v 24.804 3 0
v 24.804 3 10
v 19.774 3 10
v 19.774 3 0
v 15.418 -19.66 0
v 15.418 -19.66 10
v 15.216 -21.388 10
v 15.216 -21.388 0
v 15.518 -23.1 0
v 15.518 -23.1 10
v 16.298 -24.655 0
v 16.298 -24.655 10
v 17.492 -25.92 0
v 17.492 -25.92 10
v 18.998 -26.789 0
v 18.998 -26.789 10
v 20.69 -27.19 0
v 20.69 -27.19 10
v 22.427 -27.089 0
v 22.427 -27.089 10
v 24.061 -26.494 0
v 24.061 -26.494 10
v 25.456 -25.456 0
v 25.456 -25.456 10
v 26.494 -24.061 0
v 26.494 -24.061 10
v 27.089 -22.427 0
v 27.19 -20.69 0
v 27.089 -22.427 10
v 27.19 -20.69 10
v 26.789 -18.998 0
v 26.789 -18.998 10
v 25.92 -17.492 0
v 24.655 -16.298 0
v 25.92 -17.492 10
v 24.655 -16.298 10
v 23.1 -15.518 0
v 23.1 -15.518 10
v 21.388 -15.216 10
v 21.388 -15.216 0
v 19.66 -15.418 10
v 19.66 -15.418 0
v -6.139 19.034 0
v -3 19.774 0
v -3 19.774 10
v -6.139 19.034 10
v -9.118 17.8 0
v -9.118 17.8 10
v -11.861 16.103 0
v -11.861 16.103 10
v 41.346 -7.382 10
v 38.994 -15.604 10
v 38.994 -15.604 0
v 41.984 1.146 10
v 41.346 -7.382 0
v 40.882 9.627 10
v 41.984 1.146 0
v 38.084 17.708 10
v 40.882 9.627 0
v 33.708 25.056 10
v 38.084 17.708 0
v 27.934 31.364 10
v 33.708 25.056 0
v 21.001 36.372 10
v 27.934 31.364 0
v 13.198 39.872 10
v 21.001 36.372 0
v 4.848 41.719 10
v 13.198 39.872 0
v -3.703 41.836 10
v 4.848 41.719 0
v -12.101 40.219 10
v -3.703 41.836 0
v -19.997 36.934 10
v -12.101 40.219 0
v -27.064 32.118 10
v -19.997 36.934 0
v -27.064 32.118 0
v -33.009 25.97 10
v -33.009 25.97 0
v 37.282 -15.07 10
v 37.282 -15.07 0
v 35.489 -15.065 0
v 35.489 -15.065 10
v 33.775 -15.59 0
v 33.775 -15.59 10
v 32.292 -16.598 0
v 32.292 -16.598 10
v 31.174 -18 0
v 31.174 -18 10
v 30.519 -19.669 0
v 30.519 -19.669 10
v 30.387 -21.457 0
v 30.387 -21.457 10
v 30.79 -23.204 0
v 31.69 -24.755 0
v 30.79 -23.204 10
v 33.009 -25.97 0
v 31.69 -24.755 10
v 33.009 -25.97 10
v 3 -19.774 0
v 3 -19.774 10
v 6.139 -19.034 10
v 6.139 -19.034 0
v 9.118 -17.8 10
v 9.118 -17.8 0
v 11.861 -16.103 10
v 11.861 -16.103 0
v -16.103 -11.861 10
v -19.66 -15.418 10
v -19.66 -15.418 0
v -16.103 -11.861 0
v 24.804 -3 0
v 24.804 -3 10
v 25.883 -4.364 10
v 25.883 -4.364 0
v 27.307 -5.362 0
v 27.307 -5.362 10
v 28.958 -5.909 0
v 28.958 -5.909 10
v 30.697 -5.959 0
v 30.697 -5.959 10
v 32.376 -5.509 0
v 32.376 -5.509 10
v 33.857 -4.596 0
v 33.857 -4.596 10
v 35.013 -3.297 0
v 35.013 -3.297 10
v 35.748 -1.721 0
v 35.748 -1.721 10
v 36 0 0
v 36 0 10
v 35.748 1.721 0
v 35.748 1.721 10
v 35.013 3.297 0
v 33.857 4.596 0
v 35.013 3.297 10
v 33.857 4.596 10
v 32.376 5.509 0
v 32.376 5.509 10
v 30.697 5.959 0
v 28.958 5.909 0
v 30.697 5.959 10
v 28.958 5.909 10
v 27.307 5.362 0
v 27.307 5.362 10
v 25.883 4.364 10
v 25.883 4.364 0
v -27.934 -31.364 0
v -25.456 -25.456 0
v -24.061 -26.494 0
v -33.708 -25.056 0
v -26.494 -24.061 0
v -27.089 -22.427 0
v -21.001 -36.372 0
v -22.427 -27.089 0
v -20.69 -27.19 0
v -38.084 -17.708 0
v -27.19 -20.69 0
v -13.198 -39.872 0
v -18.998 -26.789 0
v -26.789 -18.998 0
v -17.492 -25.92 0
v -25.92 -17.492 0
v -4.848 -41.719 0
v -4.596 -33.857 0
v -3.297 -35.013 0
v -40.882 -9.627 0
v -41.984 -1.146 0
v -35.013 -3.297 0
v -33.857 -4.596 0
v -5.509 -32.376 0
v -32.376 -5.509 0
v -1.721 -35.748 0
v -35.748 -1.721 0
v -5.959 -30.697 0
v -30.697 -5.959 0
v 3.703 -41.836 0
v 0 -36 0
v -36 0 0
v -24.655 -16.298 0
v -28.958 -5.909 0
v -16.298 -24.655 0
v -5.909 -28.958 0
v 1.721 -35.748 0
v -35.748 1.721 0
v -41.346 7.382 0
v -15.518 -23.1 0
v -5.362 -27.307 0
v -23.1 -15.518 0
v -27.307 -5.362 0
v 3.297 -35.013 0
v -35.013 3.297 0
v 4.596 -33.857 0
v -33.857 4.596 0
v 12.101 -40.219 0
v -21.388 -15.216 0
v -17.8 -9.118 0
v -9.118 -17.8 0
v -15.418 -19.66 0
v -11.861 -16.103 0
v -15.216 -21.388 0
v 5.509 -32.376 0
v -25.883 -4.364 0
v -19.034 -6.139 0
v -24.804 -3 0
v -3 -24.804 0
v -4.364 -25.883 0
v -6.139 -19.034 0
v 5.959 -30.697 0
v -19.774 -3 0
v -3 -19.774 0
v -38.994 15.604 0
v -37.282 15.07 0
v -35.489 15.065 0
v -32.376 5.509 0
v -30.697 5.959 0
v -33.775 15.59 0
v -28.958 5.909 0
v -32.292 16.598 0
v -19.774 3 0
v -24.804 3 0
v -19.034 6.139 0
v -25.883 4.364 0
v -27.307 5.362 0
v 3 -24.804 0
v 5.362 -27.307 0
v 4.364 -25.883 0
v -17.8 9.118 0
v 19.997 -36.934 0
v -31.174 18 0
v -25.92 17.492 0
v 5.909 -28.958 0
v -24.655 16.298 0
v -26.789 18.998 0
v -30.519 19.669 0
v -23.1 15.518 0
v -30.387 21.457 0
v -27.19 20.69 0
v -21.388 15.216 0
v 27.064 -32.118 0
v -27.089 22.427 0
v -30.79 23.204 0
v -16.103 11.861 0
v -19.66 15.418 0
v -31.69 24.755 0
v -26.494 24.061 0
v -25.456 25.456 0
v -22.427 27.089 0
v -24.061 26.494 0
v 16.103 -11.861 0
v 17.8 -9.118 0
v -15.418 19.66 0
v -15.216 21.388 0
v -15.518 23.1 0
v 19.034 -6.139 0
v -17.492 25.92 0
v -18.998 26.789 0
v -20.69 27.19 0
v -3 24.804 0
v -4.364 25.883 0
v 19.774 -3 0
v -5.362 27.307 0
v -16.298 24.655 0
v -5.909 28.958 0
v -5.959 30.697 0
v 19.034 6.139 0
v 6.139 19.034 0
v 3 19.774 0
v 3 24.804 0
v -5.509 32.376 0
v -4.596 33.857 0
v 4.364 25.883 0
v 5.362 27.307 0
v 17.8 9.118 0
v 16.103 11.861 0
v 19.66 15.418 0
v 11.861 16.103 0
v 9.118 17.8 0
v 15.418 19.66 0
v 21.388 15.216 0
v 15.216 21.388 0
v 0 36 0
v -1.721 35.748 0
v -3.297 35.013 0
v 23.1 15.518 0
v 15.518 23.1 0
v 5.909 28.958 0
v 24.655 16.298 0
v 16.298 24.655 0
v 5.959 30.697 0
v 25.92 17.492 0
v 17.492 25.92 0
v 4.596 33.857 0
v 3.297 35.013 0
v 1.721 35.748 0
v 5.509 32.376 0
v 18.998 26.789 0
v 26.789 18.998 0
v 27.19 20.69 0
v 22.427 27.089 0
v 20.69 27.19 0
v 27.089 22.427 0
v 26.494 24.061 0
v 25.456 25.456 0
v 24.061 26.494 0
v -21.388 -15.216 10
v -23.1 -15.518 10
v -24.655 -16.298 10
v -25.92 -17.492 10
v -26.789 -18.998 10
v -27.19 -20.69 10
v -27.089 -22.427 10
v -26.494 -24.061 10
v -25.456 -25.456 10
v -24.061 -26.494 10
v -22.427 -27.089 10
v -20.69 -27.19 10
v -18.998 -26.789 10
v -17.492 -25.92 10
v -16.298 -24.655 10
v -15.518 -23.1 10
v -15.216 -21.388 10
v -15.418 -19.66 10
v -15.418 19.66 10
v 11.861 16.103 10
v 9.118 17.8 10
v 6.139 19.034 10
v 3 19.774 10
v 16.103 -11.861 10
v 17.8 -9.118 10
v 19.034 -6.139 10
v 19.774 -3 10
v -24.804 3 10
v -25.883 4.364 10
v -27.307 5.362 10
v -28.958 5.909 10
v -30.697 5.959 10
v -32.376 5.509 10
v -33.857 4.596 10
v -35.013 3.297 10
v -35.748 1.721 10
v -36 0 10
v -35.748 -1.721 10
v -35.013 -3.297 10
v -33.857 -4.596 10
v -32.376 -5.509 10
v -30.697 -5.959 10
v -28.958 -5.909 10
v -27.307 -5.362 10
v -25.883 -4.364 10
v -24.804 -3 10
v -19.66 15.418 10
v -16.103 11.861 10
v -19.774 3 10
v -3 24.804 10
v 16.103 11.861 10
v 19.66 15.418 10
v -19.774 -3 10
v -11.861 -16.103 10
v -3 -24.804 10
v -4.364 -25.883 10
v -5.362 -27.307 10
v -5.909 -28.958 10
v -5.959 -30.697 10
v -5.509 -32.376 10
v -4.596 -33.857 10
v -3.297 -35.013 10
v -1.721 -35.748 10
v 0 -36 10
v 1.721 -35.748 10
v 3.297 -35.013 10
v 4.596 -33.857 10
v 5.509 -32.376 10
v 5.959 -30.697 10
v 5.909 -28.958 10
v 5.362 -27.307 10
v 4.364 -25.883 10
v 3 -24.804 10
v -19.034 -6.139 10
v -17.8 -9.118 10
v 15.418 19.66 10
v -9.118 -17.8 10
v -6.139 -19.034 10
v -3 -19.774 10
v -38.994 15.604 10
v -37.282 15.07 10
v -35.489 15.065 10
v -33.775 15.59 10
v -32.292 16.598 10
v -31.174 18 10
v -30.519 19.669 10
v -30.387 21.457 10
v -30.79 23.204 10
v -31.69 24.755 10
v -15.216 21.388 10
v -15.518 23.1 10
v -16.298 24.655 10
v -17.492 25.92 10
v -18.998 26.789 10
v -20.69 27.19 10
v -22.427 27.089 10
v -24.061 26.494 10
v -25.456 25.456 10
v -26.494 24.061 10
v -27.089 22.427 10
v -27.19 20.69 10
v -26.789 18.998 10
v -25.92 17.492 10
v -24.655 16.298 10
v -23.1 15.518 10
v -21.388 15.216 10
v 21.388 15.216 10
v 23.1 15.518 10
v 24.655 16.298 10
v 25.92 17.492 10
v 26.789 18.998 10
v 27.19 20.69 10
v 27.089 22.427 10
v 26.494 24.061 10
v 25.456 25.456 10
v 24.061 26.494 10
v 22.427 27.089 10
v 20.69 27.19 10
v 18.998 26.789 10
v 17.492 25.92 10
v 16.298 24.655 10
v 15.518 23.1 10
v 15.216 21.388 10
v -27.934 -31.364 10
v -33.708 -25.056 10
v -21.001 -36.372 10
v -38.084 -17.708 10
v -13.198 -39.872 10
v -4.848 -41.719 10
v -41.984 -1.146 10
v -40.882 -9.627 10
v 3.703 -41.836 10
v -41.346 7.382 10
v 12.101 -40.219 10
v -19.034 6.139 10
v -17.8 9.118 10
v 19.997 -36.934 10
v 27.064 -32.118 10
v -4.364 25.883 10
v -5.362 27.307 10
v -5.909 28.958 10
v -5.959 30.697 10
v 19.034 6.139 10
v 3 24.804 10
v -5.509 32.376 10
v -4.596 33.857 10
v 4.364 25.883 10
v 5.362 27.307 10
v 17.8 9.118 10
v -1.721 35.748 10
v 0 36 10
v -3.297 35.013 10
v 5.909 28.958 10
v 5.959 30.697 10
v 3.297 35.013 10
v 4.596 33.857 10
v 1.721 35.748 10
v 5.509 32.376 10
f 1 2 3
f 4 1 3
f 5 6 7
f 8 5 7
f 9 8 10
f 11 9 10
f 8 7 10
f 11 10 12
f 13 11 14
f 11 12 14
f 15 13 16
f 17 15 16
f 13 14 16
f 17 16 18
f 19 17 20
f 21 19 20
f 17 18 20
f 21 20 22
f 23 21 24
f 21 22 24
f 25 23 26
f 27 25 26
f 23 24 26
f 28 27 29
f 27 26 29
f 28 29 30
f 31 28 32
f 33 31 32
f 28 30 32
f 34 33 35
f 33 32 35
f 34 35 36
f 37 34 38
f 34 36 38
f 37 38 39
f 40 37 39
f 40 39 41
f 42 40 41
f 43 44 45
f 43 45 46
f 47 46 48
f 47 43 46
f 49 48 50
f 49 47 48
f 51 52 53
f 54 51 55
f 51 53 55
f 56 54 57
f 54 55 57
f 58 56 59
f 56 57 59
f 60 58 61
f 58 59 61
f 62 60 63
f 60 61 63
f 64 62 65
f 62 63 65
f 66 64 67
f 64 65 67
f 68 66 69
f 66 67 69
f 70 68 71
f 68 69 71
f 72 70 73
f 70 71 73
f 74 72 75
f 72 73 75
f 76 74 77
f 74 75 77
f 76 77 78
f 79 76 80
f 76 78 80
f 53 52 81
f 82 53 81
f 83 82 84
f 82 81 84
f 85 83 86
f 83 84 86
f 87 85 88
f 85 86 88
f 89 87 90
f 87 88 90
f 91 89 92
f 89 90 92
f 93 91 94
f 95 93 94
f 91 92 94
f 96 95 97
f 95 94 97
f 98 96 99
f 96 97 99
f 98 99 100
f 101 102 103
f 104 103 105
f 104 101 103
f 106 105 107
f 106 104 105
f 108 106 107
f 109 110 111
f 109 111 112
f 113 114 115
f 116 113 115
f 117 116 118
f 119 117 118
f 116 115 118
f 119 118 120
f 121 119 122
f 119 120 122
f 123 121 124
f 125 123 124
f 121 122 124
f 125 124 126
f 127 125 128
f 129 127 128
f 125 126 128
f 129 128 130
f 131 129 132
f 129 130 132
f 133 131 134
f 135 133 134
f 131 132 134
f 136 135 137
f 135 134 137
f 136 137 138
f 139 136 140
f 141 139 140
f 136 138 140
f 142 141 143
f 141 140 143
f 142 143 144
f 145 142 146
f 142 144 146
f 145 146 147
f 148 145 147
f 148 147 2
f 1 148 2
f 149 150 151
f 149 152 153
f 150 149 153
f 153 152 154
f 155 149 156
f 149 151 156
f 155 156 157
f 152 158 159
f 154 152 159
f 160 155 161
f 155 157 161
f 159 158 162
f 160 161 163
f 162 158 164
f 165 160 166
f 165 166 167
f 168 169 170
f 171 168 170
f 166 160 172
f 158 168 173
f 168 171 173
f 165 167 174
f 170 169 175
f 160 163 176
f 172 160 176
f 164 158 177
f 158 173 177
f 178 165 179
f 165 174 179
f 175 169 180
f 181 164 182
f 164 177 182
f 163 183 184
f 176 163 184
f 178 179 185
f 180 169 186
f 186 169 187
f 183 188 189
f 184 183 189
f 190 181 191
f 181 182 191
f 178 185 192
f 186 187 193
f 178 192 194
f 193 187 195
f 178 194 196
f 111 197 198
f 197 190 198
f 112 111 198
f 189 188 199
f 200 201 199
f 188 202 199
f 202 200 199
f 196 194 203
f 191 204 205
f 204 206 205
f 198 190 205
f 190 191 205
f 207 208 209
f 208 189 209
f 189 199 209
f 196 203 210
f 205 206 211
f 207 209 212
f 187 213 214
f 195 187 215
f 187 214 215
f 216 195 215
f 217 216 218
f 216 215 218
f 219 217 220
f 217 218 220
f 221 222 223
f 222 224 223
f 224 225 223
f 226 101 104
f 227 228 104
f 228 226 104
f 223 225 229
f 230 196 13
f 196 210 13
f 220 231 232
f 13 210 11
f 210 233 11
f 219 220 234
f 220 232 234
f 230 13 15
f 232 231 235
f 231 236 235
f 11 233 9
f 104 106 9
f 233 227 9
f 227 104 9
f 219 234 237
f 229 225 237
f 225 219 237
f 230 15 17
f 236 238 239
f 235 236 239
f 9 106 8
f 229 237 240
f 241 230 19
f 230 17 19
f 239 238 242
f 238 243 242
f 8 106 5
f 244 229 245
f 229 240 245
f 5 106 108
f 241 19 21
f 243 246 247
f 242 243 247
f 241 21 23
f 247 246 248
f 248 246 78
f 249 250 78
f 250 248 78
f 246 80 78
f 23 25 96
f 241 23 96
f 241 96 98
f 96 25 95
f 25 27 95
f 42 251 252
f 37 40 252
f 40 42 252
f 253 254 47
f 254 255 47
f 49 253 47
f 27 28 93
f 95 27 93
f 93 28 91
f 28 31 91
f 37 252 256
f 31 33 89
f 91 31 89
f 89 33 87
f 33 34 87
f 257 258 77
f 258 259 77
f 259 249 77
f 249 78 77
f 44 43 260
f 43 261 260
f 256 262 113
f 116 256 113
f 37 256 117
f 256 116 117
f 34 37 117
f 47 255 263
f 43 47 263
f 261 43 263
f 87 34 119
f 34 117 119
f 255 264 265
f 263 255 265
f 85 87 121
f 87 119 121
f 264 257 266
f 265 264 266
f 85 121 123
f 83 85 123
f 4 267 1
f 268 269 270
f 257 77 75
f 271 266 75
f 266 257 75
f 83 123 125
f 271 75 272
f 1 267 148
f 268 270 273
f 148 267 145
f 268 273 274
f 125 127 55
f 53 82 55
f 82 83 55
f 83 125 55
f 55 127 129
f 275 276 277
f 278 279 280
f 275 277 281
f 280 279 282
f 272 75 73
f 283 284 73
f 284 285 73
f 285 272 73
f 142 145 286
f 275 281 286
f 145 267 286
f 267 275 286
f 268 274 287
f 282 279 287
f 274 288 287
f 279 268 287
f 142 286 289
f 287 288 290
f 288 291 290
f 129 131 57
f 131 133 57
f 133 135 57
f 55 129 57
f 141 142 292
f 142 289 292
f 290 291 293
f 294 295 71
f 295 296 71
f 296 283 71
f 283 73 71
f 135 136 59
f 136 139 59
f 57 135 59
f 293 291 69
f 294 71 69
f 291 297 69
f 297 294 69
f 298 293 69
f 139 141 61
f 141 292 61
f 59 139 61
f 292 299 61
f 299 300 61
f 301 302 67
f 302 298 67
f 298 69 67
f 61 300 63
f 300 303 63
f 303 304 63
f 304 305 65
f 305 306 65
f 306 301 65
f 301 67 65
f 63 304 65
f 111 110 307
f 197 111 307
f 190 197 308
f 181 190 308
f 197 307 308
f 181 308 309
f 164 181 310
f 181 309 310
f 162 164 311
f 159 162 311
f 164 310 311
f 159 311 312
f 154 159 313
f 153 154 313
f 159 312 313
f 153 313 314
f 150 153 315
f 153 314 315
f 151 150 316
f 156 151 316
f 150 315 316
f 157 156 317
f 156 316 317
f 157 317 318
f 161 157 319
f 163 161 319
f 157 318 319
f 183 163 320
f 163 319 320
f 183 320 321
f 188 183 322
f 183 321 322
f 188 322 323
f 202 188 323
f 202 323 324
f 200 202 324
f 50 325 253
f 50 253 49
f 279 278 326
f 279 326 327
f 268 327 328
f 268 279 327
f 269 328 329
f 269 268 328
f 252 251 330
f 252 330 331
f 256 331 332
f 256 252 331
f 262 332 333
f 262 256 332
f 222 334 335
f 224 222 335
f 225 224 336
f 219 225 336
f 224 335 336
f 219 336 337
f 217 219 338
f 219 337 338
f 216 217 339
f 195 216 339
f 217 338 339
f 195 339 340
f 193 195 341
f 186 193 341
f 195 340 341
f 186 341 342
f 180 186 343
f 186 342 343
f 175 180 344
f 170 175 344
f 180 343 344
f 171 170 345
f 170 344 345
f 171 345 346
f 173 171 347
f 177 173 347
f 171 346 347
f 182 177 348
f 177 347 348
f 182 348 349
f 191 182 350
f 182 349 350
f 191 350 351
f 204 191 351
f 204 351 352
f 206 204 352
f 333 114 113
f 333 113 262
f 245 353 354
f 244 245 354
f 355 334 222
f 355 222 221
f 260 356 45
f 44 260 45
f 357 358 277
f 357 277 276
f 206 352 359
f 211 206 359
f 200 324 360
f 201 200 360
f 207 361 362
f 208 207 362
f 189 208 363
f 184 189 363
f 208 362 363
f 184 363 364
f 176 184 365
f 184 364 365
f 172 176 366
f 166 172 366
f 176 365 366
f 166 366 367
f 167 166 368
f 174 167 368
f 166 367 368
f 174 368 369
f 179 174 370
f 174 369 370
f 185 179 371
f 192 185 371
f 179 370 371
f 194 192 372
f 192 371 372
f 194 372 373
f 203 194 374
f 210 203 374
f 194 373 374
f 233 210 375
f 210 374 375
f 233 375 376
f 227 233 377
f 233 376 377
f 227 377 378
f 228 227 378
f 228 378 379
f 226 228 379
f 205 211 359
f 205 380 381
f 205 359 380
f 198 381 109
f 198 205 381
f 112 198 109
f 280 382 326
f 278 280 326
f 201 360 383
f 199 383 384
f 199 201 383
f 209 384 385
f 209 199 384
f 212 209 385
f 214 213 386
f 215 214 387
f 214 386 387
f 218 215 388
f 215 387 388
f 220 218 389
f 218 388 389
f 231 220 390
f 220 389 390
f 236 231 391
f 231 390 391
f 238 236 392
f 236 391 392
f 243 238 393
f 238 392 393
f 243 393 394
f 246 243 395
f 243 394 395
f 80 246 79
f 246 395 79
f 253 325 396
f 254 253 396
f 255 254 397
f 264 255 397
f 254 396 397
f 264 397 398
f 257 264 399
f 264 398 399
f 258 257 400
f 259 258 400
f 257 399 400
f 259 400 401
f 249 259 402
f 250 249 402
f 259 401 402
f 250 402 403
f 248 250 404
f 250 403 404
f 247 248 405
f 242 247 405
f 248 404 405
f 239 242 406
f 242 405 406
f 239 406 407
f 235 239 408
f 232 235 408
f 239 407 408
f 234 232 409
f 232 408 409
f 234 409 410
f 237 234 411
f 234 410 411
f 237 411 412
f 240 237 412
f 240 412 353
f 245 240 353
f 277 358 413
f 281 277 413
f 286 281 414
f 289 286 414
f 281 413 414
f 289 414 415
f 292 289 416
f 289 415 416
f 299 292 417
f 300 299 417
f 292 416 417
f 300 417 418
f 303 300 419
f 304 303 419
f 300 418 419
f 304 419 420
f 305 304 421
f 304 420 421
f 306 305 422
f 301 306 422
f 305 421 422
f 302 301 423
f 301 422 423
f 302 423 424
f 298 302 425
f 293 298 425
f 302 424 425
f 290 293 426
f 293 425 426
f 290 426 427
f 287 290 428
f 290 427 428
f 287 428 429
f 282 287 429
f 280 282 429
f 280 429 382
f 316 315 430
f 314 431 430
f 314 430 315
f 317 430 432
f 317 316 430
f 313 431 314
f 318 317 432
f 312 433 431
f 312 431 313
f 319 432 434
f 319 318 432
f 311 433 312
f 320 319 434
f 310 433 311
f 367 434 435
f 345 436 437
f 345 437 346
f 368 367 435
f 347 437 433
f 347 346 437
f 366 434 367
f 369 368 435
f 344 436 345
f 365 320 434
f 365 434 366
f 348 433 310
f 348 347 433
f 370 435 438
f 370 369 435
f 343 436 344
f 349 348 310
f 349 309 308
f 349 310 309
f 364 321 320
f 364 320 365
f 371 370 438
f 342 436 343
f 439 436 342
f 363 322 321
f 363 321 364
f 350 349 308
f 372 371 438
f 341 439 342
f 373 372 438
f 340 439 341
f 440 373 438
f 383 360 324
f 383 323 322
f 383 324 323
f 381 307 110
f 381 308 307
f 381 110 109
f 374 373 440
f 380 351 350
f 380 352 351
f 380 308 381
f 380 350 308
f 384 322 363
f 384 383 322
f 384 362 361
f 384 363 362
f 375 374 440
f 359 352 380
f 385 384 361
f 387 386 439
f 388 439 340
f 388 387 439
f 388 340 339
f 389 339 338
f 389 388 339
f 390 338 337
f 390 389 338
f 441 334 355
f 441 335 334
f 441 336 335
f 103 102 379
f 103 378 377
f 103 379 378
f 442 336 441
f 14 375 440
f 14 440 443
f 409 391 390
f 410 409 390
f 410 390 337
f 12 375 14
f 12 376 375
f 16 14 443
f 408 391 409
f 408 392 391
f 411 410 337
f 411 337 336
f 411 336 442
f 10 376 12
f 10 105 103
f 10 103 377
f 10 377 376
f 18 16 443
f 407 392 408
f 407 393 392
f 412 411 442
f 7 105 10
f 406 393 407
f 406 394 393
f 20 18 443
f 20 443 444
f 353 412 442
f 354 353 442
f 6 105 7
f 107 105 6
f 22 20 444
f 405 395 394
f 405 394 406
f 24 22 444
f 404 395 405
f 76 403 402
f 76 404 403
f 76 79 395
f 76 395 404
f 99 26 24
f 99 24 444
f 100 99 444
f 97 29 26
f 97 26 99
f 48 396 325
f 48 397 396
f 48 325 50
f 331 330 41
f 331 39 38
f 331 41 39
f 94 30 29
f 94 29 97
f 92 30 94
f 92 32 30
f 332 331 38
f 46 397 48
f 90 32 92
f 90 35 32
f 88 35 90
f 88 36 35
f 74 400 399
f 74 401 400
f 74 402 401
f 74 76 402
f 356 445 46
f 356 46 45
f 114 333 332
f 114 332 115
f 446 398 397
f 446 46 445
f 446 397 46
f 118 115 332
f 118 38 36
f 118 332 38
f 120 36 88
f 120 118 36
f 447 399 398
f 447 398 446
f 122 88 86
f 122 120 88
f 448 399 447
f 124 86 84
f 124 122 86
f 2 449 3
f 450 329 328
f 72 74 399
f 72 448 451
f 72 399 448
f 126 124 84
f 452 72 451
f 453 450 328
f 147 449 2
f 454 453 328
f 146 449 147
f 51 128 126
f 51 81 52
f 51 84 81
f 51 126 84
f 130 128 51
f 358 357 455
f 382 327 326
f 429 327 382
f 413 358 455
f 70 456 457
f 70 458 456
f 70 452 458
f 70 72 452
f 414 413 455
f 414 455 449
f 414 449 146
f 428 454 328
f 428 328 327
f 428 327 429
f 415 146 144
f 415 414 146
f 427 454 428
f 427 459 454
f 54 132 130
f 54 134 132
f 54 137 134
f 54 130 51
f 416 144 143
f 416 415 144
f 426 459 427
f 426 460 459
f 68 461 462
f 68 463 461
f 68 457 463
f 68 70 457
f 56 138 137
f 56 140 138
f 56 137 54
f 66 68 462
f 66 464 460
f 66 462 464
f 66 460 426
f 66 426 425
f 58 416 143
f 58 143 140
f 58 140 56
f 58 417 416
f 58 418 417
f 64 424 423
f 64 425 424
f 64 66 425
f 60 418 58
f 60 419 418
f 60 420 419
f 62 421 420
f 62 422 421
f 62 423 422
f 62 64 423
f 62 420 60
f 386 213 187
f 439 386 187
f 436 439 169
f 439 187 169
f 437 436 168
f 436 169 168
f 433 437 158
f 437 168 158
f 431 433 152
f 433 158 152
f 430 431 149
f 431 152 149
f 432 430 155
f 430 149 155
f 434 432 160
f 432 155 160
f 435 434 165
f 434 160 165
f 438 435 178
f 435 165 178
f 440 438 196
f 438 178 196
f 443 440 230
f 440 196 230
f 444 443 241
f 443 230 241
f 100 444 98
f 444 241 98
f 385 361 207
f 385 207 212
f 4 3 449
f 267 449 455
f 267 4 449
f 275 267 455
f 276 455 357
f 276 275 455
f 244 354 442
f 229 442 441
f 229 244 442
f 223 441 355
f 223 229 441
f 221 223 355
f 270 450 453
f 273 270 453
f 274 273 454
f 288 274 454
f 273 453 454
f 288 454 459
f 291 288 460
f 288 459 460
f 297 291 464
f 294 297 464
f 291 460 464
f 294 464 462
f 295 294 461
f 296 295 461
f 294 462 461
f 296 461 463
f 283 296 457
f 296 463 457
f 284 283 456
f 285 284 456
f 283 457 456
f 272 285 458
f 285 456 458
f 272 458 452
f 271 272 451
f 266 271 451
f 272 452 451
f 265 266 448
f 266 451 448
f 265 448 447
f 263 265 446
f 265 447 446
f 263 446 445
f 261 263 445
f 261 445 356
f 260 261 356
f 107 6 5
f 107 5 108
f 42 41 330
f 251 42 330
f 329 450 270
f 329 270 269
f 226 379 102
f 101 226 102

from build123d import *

# Parameters (mm, degrees)
SKETCH_R           = 42
SKETCH_R_2         = 20
PAD_DEPTH          = 10
SKETCH001_R        = 6
POCKET_DEPTH       = 10.001
POCKET001_DEPTH    = 248.429186
POLARPATTERN_COUNT = 8


with BuildPart() as part:
    # Sketch → Pad (new body)
    with BuildSketch(Plane.XY):
        Circle(SKETCH_R)
        Circle(SKETCH_R_2, mode=Mode.SUBTRACT)
    extrude(amount=PAD_DEPTH)

    # Sketch001 (on Face4 of Pad) → Pocket (cut, through all)
    with BuildSketch(Plane.XY.offset(10)):
        with Locations((-36.37, 21)):
            Circle(SKETCH001_R)
        with Locations((36.37, -21)):
            Circle(SKETCH001_R)
    extrude(amount=-POCKET_DEPTH, mode=Mode.SUBTRACT)

    # Sketch002 (on Face4 of Pocket) → Pocket001 (cut, through all)
    with BuildSketch(Plane.XY.offset(10)):
        with BuildLine():
            ThreePointArc((3, 24.803848), (0, 36), (-3, 24.803848))
            Line((-3, 24.803848), (-3, 19.77372))
            ThreePointArc((3, 19.77372), (0, 20), (-3, 19.77372))
            Line((3, 24.803848), (3, 19.77372))
        make_face()
    pocket001 = extrude(amount=-POCKET001_DEPTH, mode=Mode.SUBTRACT)

    # PolarPattern: Pocket001 ×8 about axis
    polarpattern_axis = Axis((0, 0, 10), (0, 0, 1))
    for i in range(1, POLARPATTERN_COUNT):
        add(pocket001.rotate(polarpattern_axis, i * 360 / POLARPATTERN_COUNT), mode=Mode.SUBTRACT)


solid = part.part
